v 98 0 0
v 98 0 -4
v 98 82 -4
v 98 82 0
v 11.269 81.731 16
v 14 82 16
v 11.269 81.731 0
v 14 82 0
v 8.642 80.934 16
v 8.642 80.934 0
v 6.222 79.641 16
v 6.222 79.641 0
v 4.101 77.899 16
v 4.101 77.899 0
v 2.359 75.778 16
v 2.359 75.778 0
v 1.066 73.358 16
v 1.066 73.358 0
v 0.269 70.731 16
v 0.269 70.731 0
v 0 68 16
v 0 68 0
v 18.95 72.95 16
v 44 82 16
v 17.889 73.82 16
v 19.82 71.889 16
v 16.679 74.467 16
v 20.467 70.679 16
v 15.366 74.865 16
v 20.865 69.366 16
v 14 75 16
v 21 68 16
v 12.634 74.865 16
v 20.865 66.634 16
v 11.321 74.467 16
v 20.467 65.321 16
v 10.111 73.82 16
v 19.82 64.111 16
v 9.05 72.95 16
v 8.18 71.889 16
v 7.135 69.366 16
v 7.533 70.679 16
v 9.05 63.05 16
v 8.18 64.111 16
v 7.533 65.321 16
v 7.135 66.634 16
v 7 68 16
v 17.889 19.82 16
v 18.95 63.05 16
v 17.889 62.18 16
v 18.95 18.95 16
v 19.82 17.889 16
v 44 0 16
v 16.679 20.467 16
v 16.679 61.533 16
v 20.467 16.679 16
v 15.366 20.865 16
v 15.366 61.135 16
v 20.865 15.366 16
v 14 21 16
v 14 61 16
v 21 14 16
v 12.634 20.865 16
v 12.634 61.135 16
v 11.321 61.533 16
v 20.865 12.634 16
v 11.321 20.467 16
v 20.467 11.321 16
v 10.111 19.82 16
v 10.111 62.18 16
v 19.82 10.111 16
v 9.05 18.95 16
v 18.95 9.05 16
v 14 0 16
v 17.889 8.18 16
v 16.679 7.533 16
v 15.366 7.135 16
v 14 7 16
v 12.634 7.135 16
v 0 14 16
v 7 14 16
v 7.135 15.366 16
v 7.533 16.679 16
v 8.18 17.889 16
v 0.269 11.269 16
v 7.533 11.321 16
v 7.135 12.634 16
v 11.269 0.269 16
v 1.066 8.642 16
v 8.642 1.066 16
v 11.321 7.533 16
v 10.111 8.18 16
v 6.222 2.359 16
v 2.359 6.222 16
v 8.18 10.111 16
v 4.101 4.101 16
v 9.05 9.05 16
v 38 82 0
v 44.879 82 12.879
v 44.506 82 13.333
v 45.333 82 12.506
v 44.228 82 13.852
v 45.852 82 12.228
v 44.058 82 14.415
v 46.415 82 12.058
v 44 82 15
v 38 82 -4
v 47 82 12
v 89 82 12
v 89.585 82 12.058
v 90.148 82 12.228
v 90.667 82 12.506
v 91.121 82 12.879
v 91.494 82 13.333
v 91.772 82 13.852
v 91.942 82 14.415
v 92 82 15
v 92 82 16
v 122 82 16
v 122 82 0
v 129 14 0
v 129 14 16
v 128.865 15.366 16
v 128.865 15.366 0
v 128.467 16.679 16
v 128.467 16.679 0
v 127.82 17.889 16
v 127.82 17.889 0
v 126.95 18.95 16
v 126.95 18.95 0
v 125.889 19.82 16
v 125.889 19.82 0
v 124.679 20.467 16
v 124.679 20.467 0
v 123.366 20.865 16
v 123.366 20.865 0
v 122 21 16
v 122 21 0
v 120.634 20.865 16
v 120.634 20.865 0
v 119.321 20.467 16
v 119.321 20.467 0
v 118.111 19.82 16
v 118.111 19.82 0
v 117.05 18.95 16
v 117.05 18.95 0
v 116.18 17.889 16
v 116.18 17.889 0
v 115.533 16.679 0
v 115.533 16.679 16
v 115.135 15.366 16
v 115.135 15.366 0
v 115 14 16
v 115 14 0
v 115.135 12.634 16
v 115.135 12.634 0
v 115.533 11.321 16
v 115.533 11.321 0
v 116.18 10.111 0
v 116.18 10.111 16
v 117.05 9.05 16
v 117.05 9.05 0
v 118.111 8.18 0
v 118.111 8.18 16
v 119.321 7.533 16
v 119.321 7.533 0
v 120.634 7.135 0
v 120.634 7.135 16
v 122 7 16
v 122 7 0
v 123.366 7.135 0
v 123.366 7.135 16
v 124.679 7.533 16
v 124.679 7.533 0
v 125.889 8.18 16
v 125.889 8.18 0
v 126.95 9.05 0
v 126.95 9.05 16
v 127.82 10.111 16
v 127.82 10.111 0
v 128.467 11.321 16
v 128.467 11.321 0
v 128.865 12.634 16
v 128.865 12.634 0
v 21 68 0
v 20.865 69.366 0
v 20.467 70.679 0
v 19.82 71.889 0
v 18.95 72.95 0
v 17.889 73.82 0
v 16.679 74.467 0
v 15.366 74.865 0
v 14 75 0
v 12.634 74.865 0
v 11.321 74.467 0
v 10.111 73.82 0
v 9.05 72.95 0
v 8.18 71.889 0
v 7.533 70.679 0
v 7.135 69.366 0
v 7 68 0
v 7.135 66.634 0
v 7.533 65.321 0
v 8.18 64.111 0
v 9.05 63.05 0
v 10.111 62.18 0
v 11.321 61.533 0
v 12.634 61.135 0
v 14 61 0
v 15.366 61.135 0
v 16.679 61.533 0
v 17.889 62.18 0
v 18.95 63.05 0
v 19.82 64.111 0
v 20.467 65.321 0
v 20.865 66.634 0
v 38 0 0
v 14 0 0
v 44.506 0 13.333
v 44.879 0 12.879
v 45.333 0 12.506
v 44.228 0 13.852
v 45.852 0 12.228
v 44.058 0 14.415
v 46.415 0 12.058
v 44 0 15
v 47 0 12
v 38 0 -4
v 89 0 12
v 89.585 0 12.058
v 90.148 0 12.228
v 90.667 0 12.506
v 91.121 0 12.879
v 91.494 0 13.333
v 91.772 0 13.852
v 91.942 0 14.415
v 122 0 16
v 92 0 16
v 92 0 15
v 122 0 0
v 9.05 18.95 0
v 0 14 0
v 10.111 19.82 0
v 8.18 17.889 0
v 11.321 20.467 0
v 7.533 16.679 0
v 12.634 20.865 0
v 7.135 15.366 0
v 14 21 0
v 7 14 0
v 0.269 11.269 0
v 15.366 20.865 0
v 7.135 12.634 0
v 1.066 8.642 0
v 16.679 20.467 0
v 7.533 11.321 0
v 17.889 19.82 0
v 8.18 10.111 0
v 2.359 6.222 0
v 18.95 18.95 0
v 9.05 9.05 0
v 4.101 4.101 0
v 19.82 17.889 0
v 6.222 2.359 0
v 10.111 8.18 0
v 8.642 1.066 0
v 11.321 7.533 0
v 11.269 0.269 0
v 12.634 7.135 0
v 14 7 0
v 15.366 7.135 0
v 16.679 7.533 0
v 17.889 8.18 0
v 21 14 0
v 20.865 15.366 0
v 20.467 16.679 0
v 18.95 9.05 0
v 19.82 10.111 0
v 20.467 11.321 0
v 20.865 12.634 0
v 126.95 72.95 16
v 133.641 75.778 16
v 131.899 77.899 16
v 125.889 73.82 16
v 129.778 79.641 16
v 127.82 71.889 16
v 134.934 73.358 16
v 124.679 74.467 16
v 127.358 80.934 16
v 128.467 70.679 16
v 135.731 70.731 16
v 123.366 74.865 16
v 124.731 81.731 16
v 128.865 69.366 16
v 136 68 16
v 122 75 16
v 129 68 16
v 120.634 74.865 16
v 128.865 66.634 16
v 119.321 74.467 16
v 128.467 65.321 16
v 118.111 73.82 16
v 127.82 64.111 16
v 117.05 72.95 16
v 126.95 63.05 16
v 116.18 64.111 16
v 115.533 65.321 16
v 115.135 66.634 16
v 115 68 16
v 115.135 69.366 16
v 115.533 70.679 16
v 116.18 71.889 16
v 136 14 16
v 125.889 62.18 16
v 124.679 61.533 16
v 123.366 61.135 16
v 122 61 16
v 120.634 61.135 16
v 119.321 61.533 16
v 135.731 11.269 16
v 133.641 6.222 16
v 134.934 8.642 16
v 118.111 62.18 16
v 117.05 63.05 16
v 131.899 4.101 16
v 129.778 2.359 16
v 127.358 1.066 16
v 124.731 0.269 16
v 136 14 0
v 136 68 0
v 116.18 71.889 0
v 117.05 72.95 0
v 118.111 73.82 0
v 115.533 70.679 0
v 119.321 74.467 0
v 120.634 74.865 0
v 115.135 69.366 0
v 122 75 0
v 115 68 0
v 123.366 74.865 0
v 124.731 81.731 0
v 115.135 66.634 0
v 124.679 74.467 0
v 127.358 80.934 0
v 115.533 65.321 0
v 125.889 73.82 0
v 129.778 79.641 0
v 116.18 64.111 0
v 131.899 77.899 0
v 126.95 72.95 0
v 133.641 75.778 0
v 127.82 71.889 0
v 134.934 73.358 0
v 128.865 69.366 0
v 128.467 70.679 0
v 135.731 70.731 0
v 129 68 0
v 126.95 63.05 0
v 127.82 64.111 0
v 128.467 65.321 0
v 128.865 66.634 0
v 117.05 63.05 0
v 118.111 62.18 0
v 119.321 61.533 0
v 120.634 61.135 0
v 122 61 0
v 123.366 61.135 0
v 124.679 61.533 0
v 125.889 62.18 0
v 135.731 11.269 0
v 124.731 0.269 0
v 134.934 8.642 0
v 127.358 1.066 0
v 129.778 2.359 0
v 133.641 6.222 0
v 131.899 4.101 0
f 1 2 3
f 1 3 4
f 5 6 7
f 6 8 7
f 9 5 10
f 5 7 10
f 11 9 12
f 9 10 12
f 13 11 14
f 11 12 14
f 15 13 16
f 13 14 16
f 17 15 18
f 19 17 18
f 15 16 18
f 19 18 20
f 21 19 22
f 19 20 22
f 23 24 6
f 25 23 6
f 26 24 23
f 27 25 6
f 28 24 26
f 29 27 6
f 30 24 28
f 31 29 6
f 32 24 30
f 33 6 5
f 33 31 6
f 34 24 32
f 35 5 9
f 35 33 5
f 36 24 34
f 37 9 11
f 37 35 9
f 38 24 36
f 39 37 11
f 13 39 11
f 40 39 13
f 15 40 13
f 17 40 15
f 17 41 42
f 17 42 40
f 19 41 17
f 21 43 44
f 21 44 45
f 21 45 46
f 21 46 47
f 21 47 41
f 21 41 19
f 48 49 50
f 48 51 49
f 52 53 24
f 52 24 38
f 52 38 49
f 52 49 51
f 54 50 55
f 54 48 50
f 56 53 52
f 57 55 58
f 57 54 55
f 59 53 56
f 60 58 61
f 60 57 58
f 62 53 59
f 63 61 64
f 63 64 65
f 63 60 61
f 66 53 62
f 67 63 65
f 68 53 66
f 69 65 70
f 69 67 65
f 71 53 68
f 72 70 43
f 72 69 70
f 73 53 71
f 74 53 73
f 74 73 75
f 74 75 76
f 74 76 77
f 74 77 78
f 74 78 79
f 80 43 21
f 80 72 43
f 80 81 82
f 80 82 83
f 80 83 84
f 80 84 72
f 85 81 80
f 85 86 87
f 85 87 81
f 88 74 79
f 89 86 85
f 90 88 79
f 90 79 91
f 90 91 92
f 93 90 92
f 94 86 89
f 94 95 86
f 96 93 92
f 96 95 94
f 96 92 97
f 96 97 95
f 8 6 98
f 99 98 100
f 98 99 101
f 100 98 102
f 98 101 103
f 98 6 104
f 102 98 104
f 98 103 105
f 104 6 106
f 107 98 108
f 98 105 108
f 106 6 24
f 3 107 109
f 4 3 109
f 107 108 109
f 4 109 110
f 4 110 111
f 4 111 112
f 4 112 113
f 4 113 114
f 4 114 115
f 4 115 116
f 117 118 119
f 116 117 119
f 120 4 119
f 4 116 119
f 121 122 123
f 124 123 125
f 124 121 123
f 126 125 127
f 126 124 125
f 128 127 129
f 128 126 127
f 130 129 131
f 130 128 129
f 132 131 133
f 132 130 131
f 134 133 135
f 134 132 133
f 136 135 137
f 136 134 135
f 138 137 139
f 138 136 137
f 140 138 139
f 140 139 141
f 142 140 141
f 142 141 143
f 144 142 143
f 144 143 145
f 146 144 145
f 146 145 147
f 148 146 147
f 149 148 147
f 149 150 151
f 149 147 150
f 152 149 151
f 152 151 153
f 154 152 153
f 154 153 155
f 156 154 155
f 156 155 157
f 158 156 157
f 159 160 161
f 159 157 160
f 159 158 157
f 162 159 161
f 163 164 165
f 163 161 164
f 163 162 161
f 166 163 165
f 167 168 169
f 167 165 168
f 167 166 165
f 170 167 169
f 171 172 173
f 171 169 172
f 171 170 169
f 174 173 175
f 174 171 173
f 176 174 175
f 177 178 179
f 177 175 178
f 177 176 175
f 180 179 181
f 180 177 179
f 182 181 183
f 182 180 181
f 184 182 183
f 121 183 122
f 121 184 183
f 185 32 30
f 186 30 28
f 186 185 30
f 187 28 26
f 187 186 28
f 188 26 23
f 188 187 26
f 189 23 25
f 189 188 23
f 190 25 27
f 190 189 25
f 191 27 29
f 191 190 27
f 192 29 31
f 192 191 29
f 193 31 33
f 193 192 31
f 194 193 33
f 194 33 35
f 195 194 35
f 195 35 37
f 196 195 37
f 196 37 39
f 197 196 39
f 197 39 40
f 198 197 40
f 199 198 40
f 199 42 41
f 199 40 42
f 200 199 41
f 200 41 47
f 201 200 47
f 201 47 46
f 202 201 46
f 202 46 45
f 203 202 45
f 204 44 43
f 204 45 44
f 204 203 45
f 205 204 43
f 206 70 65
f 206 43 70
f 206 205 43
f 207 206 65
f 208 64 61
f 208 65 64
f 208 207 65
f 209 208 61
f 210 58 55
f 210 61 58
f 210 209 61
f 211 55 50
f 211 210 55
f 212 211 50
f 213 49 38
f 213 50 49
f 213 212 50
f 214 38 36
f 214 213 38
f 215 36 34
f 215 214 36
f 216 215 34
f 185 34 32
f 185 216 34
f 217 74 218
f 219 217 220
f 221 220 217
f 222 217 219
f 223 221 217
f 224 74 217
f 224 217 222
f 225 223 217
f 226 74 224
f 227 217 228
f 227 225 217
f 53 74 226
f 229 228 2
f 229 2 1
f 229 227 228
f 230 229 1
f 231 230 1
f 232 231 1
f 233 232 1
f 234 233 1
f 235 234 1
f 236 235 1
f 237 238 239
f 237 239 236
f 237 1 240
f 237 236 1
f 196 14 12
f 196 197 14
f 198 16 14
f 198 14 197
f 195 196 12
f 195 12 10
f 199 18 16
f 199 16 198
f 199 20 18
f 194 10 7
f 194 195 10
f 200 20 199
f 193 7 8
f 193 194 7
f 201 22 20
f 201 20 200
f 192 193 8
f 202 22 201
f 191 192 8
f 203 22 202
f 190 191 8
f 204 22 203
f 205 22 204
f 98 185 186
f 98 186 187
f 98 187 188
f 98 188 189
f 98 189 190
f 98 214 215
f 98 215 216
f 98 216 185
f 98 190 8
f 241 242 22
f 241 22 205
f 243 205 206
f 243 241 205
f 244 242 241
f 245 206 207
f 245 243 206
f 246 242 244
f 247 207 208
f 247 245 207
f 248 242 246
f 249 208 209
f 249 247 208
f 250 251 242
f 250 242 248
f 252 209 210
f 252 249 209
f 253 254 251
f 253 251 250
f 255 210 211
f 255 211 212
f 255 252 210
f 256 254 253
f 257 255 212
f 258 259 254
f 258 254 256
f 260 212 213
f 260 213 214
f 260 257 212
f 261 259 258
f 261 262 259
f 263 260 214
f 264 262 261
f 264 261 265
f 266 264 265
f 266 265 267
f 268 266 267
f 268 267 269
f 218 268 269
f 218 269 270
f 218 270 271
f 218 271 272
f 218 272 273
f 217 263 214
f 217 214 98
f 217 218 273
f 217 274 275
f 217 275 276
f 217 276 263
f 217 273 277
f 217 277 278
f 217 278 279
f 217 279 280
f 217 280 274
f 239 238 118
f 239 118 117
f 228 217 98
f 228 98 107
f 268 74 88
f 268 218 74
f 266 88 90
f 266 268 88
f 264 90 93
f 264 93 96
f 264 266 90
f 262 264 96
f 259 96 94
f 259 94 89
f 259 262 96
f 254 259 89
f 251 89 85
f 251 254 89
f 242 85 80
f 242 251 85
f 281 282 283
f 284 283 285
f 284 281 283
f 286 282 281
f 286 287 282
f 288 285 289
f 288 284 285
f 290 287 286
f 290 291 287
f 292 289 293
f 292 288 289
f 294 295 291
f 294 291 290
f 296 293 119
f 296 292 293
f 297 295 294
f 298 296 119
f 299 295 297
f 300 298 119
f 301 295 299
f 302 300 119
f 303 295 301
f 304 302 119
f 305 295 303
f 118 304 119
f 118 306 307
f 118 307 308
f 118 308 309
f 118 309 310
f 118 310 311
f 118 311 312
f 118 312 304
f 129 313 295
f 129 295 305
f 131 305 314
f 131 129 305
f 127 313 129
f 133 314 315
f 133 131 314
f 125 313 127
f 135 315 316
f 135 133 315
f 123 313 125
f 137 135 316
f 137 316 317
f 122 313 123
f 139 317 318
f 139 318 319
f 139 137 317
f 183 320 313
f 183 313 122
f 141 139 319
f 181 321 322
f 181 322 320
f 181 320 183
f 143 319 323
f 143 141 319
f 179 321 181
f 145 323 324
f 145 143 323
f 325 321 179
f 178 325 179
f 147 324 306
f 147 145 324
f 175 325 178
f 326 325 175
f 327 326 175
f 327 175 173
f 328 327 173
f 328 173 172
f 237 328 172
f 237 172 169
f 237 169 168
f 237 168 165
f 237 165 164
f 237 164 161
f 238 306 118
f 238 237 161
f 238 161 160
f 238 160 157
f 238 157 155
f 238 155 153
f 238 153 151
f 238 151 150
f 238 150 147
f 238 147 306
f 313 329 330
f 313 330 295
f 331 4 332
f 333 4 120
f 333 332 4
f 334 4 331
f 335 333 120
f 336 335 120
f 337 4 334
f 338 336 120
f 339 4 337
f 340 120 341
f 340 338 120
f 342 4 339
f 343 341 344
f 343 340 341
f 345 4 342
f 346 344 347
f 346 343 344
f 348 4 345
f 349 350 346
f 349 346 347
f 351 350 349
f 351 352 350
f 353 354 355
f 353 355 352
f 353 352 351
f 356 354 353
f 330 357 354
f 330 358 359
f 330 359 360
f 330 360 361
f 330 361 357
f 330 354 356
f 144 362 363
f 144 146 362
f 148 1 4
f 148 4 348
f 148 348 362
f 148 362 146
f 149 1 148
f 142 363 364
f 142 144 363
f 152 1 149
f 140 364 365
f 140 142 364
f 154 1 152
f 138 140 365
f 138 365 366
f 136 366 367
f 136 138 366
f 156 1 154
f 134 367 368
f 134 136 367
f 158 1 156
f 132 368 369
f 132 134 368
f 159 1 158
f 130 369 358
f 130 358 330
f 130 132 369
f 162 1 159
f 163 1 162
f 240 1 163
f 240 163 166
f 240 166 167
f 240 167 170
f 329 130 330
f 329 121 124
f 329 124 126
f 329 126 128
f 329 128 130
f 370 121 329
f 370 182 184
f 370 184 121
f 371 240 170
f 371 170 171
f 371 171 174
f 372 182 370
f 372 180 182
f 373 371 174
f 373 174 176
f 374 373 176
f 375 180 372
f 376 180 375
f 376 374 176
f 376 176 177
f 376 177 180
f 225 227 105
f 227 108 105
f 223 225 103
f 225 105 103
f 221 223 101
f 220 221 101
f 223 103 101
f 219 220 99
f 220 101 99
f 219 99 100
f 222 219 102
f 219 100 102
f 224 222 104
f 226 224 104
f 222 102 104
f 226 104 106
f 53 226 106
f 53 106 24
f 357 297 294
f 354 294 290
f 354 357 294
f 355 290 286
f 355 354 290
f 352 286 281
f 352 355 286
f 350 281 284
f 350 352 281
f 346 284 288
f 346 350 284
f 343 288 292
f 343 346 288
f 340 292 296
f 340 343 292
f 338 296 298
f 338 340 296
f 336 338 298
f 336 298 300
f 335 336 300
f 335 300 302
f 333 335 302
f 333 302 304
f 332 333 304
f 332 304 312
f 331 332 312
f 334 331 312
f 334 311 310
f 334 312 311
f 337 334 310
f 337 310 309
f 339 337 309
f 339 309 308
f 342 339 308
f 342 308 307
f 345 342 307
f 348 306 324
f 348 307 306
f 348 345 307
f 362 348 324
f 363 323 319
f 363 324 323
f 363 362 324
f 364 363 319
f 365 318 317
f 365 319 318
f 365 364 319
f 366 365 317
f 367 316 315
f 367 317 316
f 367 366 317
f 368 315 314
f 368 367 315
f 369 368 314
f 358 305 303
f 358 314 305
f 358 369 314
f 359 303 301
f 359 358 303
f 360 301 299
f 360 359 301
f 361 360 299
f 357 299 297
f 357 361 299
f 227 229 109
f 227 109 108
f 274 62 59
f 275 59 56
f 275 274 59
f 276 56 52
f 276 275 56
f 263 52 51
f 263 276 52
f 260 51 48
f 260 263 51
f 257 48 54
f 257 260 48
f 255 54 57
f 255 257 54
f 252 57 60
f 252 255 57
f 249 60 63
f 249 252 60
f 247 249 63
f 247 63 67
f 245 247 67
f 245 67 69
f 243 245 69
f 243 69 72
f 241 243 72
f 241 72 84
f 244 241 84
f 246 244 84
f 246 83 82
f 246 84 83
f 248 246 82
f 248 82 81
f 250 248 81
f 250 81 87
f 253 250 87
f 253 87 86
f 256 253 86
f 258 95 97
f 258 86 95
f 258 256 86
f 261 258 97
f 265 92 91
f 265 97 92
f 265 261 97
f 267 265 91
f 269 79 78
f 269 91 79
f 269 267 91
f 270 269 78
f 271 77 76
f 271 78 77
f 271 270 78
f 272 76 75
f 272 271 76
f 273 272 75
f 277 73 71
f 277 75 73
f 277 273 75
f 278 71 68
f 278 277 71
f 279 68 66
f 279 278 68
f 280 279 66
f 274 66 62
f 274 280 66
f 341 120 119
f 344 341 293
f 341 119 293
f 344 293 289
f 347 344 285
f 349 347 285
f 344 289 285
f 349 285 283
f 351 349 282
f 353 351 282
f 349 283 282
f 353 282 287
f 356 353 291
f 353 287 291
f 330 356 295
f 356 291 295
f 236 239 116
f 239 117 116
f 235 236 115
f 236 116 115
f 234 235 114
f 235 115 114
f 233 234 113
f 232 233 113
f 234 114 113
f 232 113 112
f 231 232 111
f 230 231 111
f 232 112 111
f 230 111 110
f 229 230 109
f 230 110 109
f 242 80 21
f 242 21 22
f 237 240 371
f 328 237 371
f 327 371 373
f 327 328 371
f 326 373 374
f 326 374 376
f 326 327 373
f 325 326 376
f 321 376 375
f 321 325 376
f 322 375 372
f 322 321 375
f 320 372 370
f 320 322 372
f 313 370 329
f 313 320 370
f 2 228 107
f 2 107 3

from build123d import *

# Parameters (mm, degrees)
F1_DEPTH = 82
F2_R     = 3
F3_R     = 7
F4_DEPTH = 16.001
F5_R     = 14


with BuildPart() as f1:
    # F0 (on Front) → F1 (new body)
    with BuildSketch(Plane.XZ):
        Polygon((0, 16), (0, 0), (38, 0), (38, -4), (98, -4), (98, 0), (136, 0), (136, 16), (92, 16), (92, 12), (44, 12), (44, 16), align=None)
    extrude(amount=-F1_DEPTH)

    # F2
    f2_edges = [f1.edges().sort_by_distance(p)[0] for p in [
        (44, 41, 12),
        (92, 41, 12),
    ]]
    fillet(f2_edges, radius=F2_R)

    # F3 (on Top) → F4 (cut, through all)
    with BuildSketch(Plane.XY):
        with Locations((14, 14)):
            Circle(F3_R)
        with Locations((122, 14)):
            Circle(F3_R)
        with Locations((14, 68)):
            Circle(F3_R)
        with Locations((122, 68)):
            Circle(F3_R)
    extrude(amount=F4_DEPTH, mode=Mode.SUBTRACT)

    # F5
    f5_edges = [f1.edges().sort_by_distance(p)[0] for p in [
        (0, 0, 8),
        (0, 82, 8),
        (136, 0, 8),
        (136, 82, 8),
    ]]
    fillet(f5_edges, radius=F5_R)


solid = f1.part
